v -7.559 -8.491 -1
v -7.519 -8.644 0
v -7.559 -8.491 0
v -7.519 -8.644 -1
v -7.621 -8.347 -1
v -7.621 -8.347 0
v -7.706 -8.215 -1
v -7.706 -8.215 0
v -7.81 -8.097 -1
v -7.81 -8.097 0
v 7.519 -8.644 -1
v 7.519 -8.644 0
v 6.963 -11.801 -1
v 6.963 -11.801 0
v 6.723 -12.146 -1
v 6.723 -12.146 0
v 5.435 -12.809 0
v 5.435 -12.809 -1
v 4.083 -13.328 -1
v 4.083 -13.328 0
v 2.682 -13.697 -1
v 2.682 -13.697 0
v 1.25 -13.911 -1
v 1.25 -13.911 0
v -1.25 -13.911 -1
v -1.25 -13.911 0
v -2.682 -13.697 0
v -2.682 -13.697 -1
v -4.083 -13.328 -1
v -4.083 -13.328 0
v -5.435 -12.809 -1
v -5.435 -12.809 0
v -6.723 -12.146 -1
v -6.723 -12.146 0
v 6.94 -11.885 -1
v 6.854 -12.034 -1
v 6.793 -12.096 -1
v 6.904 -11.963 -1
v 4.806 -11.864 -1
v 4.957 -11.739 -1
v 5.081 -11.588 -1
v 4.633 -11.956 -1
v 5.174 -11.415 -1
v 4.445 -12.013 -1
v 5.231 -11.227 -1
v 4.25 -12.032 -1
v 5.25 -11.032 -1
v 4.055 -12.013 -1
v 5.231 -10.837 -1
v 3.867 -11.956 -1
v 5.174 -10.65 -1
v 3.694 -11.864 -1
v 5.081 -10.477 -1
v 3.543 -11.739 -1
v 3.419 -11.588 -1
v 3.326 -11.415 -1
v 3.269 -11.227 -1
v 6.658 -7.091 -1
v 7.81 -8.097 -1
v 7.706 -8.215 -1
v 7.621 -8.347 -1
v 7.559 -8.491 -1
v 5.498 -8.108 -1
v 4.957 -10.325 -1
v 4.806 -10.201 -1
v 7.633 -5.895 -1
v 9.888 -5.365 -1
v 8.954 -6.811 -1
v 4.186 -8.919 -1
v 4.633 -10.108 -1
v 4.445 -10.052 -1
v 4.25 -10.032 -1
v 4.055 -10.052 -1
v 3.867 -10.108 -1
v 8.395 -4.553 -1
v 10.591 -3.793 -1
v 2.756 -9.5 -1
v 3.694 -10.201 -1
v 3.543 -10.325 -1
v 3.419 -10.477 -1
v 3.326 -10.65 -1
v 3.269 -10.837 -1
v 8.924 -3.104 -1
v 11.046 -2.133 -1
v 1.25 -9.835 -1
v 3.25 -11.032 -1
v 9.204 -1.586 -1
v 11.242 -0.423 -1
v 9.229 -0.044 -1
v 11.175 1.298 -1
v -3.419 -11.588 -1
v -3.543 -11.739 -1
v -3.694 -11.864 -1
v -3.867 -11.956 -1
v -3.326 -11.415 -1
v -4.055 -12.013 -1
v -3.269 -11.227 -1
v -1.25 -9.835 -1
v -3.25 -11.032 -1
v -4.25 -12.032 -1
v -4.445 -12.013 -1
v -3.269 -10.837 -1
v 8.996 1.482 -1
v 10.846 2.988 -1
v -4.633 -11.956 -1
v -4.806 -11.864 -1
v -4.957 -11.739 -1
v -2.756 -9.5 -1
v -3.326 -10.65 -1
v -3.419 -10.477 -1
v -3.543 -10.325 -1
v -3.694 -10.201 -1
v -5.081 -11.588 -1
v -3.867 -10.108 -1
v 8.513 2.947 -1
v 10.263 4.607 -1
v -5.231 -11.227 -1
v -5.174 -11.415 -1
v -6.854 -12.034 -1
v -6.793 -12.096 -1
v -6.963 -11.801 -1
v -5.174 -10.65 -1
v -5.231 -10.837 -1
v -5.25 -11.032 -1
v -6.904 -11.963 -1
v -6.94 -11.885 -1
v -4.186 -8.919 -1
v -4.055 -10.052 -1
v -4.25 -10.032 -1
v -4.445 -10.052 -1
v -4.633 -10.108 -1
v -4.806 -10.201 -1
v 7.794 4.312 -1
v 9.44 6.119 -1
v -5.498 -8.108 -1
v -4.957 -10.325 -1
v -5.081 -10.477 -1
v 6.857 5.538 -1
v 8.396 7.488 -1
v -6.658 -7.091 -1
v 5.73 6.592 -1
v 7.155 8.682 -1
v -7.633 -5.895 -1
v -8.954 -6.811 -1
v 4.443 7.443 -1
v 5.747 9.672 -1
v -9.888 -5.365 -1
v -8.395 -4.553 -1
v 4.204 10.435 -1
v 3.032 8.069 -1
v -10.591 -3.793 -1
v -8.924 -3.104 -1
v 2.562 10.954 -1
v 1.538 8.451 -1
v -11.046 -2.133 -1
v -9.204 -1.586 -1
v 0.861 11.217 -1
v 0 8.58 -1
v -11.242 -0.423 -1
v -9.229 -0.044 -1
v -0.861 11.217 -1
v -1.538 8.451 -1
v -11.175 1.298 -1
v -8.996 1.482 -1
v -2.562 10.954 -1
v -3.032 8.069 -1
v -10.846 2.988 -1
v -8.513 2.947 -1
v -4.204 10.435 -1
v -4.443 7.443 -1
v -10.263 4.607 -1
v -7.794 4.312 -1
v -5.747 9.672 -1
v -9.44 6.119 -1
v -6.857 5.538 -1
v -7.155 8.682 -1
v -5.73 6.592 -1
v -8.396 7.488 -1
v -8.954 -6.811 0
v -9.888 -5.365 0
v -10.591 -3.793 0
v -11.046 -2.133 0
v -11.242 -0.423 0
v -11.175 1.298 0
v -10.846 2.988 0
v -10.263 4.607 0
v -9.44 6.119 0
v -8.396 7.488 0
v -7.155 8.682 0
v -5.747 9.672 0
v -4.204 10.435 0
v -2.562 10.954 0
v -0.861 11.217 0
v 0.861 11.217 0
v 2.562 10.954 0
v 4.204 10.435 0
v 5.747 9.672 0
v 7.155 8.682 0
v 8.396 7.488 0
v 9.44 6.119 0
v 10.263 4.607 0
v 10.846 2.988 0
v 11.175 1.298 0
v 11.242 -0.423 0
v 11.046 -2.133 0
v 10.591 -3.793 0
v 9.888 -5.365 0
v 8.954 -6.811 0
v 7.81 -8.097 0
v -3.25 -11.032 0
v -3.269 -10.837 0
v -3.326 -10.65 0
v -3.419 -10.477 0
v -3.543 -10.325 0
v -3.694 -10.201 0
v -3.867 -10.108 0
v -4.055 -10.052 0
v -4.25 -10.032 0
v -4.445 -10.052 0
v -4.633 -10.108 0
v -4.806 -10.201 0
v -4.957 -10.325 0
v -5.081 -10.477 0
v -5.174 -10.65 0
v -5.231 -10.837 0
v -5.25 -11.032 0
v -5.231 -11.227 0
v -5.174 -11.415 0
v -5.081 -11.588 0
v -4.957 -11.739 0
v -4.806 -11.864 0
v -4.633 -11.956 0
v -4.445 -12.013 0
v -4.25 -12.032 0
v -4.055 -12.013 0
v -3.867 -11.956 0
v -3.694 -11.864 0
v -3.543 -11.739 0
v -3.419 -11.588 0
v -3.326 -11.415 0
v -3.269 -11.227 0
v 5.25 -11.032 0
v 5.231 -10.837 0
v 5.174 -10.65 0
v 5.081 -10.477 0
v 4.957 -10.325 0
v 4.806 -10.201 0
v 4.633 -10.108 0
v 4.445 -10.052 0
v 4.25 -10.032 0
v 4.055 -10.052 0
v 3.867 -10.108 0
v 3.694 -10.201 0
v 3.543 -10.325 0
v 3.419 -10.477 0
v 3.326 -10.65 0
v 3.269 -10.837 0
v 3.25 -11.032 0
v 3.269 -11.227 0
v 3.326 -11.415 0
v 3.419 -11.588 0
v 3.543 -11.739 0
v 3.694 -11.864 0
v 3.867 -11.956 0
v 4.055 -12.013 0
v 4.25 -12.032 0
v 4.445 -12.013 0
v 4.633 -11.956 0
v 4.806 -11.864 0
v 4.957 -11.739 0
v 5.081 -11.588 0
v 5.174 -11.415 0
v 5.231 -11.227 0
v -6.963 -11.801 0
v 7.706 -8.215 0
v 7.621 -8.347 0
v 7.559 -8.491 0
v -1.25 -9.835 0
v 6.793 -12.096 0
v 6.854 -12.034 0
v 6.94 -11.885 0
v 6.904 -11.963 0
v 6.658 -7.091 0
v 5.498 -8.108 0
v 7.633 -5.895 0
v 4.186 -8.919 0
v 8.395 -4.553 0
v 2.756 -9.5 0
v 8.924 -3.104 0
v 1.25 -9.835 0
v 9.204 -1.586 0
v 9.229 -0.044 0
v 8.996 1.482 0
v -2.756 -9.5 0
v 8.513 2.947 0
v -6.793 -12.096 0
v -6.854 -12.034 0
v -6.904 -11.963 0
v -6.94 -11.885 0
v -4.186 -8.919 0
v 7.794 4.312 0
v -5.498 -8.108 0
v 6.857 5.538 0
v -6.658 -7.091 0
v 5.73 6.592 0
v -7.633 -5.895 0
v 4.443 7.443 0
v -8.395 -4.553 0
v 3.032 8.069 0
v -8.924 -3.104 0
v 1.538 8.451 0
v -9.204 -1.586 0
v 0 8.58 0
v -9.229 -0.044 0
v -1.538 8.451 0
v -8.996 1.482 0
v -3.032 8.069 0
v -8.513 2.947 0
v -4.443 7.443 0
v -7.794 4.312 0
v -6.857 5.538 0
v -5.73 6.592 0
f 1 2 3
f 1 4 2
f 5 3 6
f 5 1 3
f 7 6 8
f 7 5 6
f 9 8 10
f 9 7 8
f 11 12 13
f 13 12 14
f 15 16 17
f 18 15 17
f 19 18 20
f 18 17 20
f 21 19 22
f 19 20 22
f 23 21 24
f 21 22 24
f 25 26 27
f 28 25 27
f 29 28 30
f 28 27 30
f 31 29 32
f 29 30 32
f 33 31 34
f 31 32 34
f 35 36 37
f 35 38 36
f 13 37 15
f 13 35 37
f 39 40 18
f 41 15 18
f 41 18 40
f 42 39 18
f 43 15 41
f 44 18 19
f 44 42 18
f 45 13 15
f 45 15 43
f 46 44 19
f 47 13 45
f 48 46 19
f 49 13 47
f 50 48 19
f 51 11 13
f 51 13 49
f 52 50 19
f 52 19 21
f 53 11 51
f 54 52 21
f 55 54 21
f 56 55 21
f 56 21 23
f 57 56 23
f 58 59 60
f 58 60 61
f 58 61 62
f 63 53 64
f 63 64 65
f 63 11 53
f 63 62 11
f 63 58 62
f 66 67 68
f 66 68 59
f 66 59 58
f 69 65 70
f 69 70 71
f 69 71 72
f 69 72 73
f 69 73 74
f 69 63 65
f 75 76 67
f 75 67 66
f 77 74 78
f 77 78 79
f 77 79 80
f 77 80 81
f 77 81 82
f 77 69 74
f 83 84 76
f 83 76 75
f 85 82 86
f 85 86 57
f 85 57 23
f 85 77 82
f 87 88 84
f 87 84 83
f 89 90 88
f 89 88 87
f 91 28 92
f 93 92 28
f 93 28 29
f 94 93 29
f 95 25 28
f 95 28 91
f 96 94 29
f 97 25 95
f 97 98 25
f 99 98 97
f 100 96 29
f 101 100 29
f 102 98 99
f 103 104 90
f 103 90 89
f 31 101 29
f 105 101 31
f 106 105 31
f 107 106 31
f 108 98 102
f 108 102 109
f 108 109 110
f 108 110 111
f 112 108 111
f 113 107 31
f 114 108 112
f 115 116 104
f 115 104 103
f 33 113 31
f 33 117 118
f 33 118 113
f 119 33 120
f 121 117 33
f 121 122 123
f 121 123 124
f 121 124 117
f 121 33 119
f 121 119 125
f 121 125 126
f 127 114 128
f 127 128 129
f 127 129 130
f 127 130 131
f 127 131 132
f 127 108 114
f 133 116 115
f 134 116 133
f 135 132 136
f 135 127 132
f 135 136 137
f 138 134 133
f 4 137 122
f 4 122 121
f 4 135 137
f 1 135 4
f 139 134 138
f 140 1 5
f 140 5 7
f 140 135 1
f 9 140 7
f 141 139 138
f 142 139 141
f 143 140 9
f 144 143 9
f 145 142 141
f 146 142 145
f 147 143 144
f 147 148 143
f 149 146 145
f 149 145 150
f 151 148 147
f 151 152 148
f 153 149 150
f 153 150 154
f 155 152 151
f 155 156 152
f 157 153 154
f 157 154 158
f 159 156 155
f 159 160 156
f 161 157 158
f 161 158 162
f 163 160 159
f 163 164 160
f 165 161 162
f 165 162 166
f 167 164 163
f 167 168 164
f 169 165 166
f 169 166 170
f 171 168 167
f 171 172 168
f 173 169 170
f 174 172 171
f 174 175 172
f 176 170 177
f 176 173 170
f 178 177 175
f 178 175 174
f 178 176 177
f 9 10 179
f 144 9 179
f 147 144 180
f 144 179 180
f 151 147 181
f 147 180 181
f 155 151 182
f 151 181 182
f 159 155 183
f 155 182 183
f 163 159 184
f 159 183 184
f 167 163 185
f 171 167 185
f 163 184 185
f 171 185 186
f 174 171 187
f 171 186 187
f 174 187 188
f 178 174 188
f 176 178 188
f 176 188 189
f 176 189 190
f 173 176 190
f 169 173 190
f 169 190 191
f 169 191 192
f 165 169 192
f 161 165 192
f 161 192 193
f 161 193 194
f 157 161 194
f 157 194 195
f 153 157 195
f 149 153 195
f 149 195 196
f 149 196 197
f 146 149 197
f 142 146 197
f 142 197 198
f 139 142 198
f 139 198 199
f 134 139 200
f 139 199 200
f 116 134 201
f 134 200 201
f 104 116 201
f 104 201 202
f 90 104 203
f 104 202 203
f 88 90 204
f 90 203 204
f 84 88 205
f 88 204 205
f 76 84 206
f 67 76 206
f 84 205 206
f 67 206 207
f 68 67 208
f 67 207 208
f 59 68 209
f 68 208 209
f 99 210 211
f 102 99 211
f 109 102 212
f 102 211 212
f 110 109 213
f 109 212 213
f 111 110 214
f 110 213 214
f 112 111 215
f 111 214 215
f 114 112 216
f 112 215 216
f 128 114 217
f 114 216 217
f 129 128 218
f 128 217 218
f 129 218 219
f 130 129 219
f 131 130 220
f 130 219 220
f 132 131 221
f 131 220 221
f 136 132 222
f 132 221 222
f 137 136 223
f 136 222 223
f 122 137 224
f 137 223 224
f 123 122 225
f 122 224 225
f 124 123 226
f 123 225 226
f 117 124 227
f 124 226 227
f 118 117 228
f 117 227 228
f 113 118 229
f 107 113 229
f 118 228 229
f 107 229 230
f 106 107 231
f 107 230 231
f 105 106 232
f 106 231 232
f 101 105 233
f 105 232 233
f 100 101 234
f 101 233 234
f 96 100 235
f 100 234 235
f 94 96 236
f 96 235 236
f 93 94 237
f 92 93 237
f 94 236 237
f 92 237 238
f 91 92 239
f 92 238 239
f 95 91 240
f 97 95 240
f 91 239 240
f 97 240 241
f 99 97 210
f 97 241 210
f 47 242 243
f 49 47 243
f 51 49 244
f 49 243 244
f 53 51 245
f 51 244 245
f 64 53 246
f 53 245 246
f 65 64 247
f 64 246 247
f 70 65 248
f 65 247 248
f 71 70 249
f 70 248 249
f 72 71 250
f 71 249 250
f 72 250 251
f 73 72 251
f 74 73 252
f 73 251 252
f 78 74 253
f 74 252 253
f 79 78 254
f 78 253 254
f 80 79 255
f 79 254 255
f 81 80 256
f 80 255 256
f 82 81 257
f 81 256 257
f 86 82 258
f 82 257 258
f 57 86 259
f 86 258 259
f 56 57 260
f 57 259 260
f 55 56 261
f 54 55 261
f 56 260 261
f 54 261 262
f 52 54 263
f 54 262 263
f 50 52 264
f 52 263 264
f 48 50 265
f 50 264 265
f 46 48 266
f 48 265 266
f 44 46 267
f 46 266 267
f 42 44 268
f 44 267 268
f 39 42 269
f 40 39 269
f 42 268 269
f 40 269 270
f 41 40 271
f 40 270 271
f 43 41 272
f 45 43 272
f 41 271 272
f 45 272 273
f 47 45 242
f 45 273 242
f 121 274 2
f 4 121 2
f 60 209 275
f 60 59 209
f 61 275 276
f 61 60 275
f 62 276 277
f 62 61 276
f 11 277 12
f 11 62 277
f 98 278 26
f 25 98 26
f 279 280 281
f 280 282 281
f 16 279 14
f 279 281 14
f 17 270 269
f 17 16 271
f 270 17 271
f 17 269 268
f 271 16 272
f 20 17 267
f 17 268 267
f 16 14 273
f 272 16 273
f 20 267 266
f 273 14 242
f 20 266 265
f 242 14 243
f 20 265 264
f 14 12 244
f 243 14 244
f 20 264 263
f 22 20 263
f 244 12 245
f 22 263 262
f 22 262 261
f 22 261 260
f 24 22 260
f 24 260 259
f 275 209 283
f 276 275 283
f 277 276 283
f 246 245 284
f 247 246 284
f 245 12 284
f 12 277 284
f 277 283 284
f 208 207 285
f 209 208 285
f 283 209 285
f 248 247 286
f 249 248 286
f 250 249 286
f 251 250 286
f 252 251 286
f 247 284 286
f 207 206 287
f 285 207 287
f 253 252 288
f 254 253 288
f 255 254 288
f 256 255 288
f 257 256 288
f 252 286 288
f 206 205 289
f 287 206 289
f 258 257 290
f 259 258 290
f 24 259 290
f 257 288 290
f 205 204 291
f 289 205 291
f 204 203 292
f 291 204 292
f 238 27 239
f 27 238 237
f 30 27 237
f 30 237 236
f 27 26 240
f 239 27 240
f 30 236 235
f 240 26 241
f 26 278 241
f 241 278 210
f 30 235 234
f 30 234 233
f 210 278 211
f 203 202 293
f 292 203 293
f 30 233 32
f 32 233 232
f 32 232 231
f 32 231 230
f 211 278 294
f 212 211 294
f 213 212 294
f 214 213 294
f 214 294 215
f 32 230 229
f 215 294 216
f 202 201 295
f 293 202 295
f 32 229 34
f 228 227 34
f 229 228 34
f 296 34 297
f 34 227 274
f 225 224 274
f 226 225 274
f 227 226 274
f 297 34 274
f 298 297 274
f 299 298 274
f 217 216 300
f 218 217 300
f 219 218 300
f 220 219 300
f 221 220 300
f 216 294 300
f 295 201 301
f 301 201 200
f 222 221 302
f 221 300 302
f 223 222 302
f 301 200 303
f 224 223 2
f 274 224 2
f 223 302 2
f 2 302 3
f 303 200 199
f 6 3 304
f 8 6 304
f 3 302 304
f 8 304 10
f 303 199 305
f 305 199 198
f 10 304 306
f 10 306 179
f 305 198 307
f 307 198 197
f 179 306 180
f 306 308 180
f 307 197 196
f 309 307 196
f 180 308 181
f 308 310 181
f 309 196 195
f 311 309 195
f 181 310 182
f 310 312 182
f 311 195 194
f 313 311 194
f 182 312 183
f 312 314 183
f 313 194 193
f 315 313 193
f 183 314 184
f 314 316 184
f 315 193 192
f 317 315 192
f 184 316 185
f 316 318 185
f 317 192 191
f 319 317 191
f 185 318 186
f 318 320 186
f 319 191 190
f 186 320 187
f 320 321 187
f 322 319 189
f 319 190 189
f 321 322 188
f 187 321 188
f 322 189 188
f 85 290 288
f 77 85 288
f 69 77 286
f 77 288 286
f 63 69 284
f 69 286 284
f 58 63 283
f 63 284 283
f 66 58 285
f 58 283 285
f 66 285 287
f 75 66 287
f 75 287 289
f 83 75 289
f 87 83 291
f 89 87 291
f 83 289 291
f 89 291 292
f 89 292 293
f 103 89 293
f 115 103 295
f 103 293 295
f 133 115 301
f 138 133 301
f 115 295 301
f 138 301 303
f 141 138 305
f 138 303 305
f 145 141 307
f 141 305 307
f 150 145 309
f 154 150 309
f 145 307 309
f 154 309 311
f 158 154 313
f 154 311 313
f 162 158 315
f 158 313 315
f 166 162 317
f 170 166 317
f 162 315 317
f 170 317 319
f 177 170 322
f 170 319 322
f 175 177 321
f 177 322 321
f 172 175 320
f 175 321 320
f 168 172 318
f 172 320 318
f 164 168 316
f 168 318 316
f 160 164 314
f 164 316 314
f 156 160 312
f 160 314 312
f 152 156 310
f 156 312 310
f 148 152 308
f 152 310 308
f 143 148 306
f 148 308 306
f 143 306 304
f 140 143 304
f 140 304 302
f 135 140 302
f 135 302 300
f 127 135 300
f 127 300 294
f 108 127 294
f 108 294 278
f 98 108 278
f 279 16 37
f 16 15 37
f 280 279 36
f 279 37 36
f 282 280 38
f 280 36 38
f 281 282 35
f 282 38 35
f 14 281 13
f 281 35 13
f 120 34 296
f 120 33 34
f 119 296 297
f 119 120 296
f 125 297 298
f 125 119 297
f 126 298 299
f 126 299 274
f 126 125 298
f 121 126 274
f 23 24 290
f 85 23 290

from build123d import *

# Parameters (mm, degrees)
SKETCH1_R  = 1
BODY_DEPTH = 1
FILLET1_R  = 0.5
FILLET2_R  = 1


with BuildPart() as part:
    # Sketch1 → Body (new body)
    with BuildSketch(Plane.XY):
        with BuildLine():
            Line((-1.25, -9.83515139), (-1.25, -13.911129106))
            ThreePointArc((-1.25, -13.911129106), (-4.193699318, -13.291524711), (-6.922858868, -12.026232874))
            Line((-6.922858868, -12.026232874), (-7.577141132, -8.315613763))
            ThreePointArc((-7.577141132, -8.315613763), (0, 11.25), (7.577141132, -8.315613763))
            Line((7.577141132, -8.315613763), (6.922858868, -12.026232874))
            ThreePointArc((6.922858868, -12.026232874), (4.193699318, -13.291524711), (1.25, -13.911129106))
            Line((1.25, -13.911129106), (1.25, -9.83515139))
            ThreePointArc((1.25, -9.83515139), (0, 8.58), (-1.25, -9.83515139))
        make_face()
        with Locations((4.25, -11.032311518)):
            Circle(SKETCH1_R, mode=Mode.SUBTRACT)
        with Locations((-4.25, -11.032311518)):
            Circle(SKETCH1_R, mode=Mode.SUBTRACT)
    extrude(amount=-BODY_DEPTH)

    # Fillet1
    fillet1_edges = [part.edges().sort_by_distance(p)[0] for p in [
        (-6.922858868, -12.026232874, -0.5),
        (6.922858868, -12.026232874, -0.5),
    ]]
    fillet(fillet1_edges, radius=FILLET1_R)

    # Fillet2
    fillet2_edges = [part.edges().sort_by_distance(p)[0] for p in [
        (-7.577141132, -8.315613763, -0.5),
        (7.577141132, -8.315613763, -0.5),
    ]]
    fillet(fillet2_edges, radius=FILLET2_R)


solid = part.part
